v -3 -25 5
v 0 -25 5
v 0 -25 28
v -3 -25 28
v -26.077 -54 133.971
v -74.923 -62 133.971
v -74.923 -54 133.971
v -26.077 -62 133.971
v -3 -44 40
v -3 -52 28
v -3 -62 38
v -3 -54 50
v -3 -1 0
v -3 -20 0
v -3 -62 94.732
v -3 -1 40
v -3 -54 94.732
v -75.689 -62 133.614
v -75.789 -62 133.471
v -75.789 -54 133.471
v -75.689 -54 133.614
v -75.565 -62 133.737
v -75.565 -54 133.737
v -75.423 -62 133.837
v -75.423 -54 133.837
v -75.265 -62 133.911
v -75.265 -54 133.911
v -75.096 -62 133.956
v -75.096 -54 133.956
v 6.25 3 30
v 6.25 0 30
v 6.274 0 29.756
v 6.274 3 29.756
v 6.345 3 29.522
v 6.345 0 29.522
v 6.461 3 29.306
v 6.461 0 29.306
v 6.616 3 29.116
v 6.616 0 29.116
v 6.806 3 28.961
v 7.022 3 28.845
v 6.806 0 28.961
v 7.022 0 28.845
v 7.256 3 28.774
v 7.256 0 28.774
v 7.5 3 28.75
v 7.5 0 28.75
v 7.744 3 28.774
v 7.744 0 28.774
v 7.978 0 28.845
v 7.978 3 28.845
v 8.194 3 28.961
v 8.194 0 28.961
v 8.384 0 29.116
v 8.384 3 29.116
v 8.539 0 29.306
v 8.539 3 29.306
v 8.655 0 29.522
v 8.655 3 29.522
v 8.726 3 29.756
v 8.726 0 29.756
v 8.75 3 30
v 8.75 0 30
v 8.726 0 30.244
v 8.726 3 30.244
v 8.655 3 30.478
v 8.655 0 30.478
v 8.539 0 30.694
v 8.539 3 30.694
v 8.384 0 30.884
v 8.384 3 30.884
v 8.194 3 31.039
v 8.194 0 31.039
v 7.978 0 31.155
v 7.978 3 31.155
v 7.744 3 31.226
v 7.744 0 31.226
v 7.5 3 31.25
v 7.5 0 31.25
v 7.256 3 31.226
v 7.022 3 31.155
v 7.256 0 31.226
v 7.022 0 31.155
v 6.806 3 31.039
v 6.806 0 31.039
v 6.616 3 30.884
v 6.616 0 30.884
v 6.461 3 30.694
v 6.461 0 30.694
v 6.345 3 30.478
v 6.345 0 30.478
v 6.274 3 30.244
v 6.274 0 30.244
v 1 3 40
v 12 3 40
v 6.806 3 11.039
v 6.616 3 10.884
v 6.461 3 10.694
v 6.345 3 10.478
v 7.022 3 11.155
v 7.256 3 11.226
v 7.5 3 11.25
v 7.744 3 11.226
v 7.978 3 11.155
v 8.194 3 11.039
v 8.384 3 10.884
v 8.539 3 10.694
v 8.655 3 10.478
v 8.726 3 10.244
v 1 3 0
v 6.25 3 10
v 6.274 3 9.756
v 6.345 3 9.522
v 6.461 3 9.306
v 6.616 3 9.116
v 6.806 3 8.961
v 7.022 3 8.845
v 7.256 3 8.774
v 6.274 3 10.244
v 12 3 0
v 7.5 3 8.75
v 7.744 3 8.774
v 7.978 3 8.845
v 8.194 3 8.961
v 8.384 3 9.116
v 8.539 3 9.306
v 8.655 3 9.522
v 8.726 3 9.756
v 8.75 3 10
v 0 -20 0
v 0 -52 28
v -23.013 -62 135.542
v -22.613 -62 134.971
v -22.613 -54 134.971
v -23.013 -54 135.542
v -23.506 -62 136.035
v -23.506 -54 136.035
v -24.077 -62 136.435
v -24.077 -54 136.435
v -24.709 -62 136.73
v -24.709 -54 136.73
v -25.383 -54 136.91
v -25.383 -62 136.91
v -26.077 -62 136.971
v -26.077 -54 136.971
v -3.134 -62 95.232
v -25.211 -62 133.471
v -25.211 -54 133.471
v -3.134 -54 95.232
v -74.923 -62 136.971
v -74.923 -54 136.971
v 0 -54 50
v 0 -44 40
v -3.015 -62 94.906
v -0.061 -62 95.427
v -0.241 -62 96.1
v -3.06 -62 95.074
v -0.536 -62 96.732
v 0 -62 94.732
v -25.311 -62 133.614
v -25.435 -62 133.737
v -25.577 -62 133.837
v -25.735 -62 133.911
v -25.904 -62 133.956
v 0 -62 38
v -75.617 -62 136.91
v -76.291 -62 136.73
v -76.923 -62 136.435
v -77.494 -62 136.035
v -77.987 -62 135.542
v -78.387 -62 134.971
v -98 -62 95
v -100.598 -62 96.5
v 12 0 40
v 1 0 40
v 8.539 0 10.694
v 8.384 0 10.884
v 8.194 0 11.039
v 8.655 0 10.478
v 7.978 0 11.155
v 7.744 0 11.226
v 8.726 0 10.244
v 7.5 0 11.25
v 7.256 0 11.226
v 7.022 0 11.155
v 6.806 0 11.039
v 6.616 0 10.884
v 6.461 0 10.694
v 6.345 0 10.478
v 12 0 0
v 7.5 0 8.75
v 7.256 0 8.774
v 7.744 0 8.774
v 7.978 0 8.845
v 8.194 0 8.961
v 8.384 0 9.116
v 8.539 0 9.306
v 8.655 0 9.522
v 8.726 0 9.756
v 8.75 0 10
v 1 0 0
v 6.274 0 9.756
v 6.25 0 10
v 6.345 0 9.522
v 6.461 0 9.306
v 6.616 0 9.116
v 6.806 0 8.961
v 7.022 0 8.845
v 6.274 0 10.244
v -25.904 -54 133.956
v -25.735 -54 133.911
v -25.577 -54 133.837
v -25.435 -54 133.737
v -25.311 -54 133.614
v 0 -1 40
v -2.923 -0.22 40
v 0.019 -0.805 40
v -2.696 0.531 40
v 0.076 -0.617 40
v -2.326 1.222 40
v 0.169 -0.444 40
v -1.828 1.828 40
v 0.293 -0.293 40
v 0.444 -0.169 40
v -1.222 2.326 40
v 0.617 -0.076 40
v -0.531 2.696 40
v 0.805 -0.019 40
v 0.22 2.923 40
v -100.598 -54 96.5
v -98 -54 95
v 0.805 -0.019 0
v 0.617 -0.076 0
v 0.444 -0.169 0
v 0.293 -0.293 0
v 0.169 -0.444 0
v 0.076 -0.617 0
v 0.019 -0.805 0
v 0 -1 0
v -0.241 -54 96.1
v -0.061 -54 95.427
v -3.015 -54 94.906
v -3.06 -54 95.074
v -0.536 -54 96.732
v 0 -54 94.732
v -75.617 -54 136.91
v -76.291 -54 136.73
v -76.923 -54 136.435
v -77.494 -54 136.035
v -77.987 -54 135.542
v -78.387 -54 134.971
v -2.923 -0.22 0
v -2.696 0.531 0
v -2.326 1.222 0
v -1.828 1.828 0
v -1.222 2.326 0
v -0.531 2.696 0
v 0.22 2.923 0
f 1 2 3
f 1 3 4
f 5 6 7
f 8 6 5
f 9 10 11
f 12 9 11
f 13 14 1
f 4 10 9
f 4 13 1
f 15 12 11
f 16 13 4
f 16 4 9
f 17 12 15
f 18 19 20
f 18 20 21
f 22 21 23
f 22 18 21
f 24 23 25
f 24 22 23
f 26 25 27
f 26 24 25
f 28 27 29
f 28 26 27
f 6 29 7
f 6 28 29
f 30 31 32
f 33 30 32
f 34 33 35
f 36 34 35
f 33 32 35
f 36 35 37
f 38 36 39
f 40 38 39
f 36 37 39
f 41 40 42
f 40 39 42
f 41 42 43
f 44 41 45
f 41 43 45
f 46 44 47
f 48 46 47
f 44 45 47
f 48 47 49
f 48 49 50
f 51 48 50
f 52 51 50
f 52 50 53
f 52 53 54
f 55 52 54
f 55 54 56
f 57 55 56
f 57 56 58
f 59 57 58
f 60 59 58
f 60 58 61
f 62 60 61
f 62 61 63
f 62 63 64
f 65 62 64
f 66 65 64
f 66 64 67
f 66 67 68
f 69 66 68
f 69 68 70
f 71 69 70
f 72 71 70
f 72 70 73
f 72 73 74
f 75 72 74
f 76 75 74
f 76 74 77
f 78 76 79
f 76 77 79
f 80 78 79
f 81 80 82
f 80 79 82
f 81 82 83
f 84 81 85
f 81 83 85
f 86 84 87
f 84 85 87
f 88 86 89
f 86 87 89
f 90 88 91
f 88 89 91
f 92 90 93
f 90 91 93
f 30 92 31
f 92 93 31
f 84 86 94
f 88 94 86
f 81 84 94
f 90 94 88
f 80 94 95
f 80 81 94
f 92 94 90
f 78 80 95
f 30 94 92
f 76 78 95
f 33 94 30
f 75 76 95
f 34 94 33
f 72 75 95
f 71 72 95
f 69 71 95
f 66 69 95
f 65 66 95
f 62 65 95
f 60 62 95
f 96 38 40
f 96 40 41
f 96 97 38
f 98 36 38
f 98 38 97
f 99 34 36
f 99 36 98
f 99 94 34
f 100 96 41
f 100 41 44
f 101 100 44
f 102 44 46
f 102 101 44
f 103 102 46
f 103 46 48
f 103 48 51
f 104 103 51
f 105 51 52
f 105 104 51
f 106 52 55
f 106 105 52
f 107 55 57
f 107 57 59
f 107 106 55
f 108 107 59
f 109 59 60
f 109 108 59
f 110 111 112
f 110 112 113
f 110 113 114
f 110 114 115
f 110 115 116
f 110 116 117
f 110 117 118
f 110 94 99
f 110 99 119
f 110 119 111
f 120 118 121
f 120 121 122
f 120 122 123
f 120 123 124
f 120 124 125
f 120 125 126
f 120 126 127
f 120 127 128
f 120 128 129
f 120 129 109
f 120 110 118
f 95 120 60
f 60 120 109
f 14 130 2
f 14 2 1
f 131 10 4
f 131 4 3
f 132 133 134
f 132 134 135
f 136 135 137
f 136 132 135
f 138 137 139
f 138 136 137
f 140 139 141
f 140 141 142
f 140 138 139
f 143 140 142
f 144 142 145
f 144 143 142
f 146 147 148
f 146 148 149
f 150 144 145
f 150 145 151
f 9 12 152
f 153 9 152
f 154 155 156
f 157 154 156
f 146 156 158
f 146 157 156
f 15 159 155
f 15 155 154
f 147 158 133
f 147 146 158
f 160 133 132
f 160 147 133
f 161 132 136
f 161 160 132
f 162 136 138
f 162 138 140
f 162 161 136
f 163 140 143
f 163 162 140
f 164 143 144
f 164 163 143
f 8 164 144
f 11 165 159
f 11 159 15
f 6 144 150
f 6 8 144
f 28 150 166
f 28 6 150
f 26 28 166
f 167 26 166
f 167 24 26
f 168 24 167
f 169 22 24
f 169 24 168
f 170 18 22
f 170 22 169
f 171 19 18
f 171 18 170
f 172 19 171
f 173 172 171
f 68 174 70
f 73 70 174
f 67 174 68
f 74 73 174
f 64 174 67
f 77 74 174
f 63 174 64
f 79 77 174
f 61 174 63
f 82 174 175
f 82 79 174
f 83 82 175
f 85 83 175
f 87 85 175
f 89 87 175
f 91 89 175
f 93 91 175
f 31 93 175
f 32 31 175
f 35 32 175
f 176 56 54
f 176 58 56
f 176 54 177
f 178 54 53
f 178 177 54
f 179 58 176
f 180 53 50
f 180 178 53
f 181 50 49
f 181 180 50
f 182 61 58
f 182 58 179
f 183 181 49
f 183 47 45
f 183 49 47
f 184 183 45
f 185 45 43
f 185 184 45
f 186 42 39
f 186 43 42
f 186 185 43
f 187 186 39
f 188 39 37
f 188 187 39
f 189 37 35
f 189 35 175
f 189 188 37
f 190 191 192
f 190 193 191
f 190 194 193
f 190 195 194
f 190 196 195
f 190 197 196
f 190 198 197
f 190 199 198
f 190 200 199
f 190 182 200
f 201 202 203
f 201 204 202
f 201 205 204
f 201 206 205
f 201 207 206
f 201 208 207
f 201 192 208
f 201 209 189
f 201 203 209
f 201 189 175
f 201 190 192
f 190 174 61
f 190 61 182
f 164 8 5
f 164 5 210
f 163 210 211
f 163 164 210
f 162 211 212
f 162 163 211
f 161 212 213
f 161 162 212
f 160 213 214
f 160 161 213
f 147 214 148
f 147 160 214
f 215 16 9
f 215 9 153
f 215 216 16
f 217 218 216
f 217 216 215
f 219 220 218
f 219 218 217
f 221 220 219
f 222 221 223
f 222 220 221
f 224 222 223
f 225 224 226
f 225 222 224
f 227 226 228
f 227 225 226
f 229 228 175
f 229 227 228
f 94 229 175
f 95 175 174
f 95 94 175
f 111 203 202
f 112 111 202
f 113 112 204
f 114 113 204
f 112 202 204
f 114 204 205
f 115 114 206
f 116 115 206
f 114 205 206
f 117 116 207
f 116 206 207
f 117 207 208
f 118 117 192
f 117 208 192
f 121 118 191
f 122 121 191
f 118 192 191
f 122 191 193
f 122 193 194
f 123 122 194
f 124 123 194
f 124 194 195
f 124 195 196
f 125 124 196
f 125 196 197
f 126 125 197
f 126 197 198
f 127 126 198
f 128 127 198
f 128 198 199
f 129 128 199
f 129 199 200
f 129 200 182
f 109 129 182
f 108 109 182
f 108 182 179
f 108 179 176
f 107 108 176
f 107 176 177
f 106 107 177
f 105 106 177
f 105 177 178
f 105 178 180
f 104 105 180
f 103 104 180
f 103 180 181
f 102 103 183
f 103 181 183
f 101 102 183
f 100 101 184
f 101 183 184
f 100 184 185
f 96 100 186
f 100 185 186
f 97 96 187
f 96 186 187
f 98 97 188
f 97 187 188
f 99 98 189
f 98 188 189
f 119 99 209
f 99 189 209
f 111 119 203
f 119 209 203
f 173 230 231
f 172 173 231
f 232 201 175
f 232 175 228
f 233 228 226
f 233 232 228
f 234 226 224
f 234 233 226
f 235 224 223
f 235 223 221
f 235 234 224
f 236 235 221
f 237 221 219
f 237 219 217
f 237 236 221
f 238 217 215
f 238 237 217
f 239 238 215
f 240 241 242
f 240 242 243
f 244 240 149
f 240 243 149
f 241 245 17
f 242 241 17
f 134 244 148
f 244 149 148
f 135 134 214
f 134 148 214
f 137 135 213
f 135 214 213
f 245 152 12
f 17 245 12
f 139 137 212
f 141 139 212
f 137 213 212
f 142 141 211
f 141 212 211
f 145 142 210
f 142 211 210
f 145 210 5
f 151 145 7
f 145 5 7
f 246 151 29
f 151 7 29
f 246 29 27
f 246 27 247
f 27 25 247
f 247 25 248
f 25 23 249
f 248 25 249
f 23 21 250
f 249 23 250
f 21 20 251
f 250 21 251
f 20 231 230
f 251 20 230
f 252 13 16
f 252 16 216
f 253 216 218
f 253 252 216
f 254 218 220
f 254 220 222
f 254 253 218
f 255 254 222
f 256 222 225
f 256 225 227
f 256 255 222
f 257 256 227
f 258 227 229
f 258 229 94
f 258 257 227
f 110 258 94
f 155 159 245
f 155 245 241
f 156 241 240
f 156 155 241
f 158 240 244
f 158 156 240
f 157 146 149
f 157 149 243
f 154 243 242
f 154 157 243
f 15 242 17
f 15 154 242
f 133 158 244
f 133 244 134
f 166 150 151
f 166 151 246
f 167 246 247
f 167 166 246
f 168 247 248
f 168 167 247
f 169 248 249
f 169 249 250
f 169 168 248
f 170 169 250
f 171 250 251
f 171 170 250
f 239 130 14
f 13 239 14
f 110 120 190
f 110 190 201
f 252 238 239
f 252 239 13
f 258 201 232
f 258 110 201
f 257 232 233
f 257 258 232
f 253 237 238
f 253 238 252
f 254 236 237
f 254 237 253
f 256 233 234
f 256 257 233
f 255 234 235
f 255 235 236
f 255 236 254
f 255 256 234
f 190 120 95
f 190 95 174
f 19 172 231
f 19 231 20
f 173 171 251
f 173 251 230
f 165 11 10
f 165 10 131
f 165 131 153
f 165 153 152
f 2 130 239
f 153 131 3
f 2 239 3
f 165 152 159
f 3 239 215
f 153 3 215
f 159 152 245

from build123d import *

# Parameters (mm, degrees)
SM_BASE_FLANGE_1_DEPTH           = 40
M3X0_5_1_D                       = 2.5
SKETCH_22_W                      = 3
SKETCH_22_H                      = 12
EXTRUDE_6_DEPTH                  = 29
SKETCH_23_W                      = 3
SKETCH_23_H                      = 67
EXTRUDE_7_DEPTH                  = 8
CHAMFER_1_SIZE                   = 10
CHAMFER_2_SIZE                   = 5
SM_EDGE_FLANGE_1_STRIP_CUT_DEPTH = 8
SM_EDGE_FLANGE_1_DEPTH           = 8
SM_EDGE_FLANGE_2_STRIP_CUT_DEPTH = 8
SM_EDGE_FLANGE_2_DEPTH           = 8
SM_EDGE_FLANGE_3_STRIP_CUT_DEPTH = 8
SM_EDGE_FLANGE_3_DEPTH           = 8


# Sheet-metal steps are written as plain solids
with BuildPart() as part:
    # 草圖3 → 基材-凸緣1 (new body)
    with BuildSketch(Plane.XY):
        with BuildLine():
            Line((12, 0), (1, 0))
            ThreePointArc((1, 0), (0.292893219, -0.292893219), (0, -1))
            Line((0, -1), (0, -25))
            Line((0, -25), (-3, -25))
            Line((-3, -25), (-3, -1))
            ThreePointArc((-3, -1), (-1.828427125, 1.828427125), (1, 3))
            Line((1, 3), (12, 3))
            Line((12, 3), (12, 0))
        make_face()
    extrude(amount=SM_BASE_FLANGE_1_DEPTH)

    # M3x0.5 螺紋孔1 (through all)
    with Locations(Plane(origin=(0, 3, 0), x_dir=(1, 0, 0), z_dir=(0, 1, 0))):
        with Locations((7.5, -30), (7.5, -10)):
            Hole(M3X0_5_1_D / 2)

    # 草圖22 → 填料-伸長6 (add)
    with BuildSketch(Plane.XZ.offset(25)):
        with Locations((-1.5, 34)):
            Rectangle(SKETCH_22_W, SKETCH_22_H)
    extrude(amount=EXTRUDE_6_DEPTH)

    # 草圖23 → 填料-伸長7 (add)
    with BuildSketch(Plane.XZ.offset(54)):
        with Locations((-1.5, 61.5)):
            Rectangle(SKETCH_23_W, SKETCH_23_H)
    extrude(amount=EXTRUDE_7_DEPTH)

    # 導角1
    chamfer_1_edges = [part.edges().sort_by_distance(p)[0] for p in [
        (-1.5, -54, 40),
        (-1.5, -62, 28),
    ]]
    chamfer(chamfer_1_edges, length=CHAMFER_1_SIZE)

    # 導角2
    chamfer_2_edges = [part.edges().sort_by_distance(p)[0] for p in [
        (-1.5, -25, 0),
    ]]
    chamfer(chamfer_2_edges, length=CHAMFER_2_SIZE)

    # 邊線-凸緣1 strip (across the edge) → 邊線-凸緣1 strip cut (cut)
    with BuildSketch(Plane(origin=(-3, -62, 95), x_dir=(-0.8660254037844416, 0, -0.49999999999999495), z_dir=(0, 1, 0))):
        Polygon((-9.464101615, 10.392304845), (-2.464101615, -1.732050808), (0.133974596, -0.232050808), (-6.866025404, 11.892304845), align=None)
    extrude(amount=SM_EDGE_FLANGE_1_STRIP_CUT_DEPTH, mode=Mode.SUBTRACT)

    # 邊線-凸緣1 section (across the edge) → 邊線-凸緣1 (add)
    with BuildSketch(Plane(origin=(-3, -62, 95), x_dir=(-0.8660254037844416, 0, -0.49999999999999495), z_dir=(0, 1, 0))):
        with BuildLine():
            Line((-3, 0.267949192), (-3, 45))
            Line((-3, 45), (0, 45))
            Line((0, 45), (0, 0.267949192))
            ThreePointArc((0, 0.267949192), (0.034074174, 0.009130147), (0.133974596, -0.232050808))
            Line((0.133974596, -0.232050808), (-2.464101615, -1.732050808))
            ThreePointArc((-2.464101615, -1.732050808), (-2.863703305, -0.767326988), (-3, 0.267949192))
        make_face()
    extrude(amount=SM_EDGE_FLANGE_1_DEPTH)

    # 邊線-凸緣2 strip (across the edge) → 邊線-凸緣2 strip cut (cut)
    with BuildSketch(Plane(origin=(-25.5, -62, 133.97114317), x_dir=(0, 0, -1), z_dir=(0, 1, 0))):
        Polygon((-13.124355653, 4.113248654), (-1, -2.886751346), (0.5, -0.288675135), (-11.624355653, 6.711324865), align=None)
    extrude(amount=SM_EDGE_FLANGE_2_STRIP_CUT_DEPTH, mode=Mode.SUBTRACT)

    # 邊線-凸緣2 section (across the edge) → 邊線-凸緣2 (add)
    with BuildSketch(Plane(origin=(-25.5, -62, 133.97114317), x_dir=(0, 0, -1), z_dir=(0, 1, 0))):
        with BuildLine():
            Line((-3, 0.577350269), (-3, 50))
            Line((-3, 50), (0, 50))
            Line((0, 50), (0, 0.577350269))
            ThreePointArc((0, 0.577350269), (0.133974596, 0.077350269), (0.5, -0.288675135))
            Line((0.5, -0.288675135), (-1, -2.886751346))
            ThreePointArc((-1, -2.886751346), (-2.464101615, -1.422649731), (-3, 0.577350269))
        make_face()
    extrude(amount=SM_EDGE_FLANGE_2_DEPTH)

    # 邊線-凸緣3 strip (across the edge) → 邊線-凸緣3 strip cut (cut)
    with BuildSketch(Plane(origin=(-75.5, -62, 133.97114317), x_dir=(0.8660254037844312, 0, -0.5000000000000132), z_dir=(0, 1, 0))):
        Polygon((-13.124355653, 4.113248654), (-1, -2.886751346), (0.5, -0.288675135), (-11.624355653, 6.711324865), align=None)
    extrude(amount=SM_EDGE_FLANGE_3_STRIP_CUT_DEPTH, mode=Mode.SUBTRACT)

    # 邊線-凸緣3 section (across the edge) → 邊線-凸緣3 (add)
    with BuildSketch(Plane(origin=(-75.5, -62, 133.97114317), x_dir=(0.8660254037844312, 0, -0.5000000000000132), z_dir=(0, 1, 0))):
        with BuildLine():
            Line((-3, 0.577350269), (-3, 45))
            Line((-3, 45), (0, 45))
            Line((0, 45), (0, 0.577350269))
            ThreePointArc((0, 0.577350269), (0.133974596, 0.077350269), (0.5, -0.288675135))
            Line((0.5, -0.288675135), (-1, -2.886751346))
            ThreePointArc((-1, -2.886751346), (-2.464101615, -1.422649731), (-3, 0.577350269))
        make_face()
    extrude(amount=SM_EDGE_FLANGE_3_DEPTH)


solid = part.part
